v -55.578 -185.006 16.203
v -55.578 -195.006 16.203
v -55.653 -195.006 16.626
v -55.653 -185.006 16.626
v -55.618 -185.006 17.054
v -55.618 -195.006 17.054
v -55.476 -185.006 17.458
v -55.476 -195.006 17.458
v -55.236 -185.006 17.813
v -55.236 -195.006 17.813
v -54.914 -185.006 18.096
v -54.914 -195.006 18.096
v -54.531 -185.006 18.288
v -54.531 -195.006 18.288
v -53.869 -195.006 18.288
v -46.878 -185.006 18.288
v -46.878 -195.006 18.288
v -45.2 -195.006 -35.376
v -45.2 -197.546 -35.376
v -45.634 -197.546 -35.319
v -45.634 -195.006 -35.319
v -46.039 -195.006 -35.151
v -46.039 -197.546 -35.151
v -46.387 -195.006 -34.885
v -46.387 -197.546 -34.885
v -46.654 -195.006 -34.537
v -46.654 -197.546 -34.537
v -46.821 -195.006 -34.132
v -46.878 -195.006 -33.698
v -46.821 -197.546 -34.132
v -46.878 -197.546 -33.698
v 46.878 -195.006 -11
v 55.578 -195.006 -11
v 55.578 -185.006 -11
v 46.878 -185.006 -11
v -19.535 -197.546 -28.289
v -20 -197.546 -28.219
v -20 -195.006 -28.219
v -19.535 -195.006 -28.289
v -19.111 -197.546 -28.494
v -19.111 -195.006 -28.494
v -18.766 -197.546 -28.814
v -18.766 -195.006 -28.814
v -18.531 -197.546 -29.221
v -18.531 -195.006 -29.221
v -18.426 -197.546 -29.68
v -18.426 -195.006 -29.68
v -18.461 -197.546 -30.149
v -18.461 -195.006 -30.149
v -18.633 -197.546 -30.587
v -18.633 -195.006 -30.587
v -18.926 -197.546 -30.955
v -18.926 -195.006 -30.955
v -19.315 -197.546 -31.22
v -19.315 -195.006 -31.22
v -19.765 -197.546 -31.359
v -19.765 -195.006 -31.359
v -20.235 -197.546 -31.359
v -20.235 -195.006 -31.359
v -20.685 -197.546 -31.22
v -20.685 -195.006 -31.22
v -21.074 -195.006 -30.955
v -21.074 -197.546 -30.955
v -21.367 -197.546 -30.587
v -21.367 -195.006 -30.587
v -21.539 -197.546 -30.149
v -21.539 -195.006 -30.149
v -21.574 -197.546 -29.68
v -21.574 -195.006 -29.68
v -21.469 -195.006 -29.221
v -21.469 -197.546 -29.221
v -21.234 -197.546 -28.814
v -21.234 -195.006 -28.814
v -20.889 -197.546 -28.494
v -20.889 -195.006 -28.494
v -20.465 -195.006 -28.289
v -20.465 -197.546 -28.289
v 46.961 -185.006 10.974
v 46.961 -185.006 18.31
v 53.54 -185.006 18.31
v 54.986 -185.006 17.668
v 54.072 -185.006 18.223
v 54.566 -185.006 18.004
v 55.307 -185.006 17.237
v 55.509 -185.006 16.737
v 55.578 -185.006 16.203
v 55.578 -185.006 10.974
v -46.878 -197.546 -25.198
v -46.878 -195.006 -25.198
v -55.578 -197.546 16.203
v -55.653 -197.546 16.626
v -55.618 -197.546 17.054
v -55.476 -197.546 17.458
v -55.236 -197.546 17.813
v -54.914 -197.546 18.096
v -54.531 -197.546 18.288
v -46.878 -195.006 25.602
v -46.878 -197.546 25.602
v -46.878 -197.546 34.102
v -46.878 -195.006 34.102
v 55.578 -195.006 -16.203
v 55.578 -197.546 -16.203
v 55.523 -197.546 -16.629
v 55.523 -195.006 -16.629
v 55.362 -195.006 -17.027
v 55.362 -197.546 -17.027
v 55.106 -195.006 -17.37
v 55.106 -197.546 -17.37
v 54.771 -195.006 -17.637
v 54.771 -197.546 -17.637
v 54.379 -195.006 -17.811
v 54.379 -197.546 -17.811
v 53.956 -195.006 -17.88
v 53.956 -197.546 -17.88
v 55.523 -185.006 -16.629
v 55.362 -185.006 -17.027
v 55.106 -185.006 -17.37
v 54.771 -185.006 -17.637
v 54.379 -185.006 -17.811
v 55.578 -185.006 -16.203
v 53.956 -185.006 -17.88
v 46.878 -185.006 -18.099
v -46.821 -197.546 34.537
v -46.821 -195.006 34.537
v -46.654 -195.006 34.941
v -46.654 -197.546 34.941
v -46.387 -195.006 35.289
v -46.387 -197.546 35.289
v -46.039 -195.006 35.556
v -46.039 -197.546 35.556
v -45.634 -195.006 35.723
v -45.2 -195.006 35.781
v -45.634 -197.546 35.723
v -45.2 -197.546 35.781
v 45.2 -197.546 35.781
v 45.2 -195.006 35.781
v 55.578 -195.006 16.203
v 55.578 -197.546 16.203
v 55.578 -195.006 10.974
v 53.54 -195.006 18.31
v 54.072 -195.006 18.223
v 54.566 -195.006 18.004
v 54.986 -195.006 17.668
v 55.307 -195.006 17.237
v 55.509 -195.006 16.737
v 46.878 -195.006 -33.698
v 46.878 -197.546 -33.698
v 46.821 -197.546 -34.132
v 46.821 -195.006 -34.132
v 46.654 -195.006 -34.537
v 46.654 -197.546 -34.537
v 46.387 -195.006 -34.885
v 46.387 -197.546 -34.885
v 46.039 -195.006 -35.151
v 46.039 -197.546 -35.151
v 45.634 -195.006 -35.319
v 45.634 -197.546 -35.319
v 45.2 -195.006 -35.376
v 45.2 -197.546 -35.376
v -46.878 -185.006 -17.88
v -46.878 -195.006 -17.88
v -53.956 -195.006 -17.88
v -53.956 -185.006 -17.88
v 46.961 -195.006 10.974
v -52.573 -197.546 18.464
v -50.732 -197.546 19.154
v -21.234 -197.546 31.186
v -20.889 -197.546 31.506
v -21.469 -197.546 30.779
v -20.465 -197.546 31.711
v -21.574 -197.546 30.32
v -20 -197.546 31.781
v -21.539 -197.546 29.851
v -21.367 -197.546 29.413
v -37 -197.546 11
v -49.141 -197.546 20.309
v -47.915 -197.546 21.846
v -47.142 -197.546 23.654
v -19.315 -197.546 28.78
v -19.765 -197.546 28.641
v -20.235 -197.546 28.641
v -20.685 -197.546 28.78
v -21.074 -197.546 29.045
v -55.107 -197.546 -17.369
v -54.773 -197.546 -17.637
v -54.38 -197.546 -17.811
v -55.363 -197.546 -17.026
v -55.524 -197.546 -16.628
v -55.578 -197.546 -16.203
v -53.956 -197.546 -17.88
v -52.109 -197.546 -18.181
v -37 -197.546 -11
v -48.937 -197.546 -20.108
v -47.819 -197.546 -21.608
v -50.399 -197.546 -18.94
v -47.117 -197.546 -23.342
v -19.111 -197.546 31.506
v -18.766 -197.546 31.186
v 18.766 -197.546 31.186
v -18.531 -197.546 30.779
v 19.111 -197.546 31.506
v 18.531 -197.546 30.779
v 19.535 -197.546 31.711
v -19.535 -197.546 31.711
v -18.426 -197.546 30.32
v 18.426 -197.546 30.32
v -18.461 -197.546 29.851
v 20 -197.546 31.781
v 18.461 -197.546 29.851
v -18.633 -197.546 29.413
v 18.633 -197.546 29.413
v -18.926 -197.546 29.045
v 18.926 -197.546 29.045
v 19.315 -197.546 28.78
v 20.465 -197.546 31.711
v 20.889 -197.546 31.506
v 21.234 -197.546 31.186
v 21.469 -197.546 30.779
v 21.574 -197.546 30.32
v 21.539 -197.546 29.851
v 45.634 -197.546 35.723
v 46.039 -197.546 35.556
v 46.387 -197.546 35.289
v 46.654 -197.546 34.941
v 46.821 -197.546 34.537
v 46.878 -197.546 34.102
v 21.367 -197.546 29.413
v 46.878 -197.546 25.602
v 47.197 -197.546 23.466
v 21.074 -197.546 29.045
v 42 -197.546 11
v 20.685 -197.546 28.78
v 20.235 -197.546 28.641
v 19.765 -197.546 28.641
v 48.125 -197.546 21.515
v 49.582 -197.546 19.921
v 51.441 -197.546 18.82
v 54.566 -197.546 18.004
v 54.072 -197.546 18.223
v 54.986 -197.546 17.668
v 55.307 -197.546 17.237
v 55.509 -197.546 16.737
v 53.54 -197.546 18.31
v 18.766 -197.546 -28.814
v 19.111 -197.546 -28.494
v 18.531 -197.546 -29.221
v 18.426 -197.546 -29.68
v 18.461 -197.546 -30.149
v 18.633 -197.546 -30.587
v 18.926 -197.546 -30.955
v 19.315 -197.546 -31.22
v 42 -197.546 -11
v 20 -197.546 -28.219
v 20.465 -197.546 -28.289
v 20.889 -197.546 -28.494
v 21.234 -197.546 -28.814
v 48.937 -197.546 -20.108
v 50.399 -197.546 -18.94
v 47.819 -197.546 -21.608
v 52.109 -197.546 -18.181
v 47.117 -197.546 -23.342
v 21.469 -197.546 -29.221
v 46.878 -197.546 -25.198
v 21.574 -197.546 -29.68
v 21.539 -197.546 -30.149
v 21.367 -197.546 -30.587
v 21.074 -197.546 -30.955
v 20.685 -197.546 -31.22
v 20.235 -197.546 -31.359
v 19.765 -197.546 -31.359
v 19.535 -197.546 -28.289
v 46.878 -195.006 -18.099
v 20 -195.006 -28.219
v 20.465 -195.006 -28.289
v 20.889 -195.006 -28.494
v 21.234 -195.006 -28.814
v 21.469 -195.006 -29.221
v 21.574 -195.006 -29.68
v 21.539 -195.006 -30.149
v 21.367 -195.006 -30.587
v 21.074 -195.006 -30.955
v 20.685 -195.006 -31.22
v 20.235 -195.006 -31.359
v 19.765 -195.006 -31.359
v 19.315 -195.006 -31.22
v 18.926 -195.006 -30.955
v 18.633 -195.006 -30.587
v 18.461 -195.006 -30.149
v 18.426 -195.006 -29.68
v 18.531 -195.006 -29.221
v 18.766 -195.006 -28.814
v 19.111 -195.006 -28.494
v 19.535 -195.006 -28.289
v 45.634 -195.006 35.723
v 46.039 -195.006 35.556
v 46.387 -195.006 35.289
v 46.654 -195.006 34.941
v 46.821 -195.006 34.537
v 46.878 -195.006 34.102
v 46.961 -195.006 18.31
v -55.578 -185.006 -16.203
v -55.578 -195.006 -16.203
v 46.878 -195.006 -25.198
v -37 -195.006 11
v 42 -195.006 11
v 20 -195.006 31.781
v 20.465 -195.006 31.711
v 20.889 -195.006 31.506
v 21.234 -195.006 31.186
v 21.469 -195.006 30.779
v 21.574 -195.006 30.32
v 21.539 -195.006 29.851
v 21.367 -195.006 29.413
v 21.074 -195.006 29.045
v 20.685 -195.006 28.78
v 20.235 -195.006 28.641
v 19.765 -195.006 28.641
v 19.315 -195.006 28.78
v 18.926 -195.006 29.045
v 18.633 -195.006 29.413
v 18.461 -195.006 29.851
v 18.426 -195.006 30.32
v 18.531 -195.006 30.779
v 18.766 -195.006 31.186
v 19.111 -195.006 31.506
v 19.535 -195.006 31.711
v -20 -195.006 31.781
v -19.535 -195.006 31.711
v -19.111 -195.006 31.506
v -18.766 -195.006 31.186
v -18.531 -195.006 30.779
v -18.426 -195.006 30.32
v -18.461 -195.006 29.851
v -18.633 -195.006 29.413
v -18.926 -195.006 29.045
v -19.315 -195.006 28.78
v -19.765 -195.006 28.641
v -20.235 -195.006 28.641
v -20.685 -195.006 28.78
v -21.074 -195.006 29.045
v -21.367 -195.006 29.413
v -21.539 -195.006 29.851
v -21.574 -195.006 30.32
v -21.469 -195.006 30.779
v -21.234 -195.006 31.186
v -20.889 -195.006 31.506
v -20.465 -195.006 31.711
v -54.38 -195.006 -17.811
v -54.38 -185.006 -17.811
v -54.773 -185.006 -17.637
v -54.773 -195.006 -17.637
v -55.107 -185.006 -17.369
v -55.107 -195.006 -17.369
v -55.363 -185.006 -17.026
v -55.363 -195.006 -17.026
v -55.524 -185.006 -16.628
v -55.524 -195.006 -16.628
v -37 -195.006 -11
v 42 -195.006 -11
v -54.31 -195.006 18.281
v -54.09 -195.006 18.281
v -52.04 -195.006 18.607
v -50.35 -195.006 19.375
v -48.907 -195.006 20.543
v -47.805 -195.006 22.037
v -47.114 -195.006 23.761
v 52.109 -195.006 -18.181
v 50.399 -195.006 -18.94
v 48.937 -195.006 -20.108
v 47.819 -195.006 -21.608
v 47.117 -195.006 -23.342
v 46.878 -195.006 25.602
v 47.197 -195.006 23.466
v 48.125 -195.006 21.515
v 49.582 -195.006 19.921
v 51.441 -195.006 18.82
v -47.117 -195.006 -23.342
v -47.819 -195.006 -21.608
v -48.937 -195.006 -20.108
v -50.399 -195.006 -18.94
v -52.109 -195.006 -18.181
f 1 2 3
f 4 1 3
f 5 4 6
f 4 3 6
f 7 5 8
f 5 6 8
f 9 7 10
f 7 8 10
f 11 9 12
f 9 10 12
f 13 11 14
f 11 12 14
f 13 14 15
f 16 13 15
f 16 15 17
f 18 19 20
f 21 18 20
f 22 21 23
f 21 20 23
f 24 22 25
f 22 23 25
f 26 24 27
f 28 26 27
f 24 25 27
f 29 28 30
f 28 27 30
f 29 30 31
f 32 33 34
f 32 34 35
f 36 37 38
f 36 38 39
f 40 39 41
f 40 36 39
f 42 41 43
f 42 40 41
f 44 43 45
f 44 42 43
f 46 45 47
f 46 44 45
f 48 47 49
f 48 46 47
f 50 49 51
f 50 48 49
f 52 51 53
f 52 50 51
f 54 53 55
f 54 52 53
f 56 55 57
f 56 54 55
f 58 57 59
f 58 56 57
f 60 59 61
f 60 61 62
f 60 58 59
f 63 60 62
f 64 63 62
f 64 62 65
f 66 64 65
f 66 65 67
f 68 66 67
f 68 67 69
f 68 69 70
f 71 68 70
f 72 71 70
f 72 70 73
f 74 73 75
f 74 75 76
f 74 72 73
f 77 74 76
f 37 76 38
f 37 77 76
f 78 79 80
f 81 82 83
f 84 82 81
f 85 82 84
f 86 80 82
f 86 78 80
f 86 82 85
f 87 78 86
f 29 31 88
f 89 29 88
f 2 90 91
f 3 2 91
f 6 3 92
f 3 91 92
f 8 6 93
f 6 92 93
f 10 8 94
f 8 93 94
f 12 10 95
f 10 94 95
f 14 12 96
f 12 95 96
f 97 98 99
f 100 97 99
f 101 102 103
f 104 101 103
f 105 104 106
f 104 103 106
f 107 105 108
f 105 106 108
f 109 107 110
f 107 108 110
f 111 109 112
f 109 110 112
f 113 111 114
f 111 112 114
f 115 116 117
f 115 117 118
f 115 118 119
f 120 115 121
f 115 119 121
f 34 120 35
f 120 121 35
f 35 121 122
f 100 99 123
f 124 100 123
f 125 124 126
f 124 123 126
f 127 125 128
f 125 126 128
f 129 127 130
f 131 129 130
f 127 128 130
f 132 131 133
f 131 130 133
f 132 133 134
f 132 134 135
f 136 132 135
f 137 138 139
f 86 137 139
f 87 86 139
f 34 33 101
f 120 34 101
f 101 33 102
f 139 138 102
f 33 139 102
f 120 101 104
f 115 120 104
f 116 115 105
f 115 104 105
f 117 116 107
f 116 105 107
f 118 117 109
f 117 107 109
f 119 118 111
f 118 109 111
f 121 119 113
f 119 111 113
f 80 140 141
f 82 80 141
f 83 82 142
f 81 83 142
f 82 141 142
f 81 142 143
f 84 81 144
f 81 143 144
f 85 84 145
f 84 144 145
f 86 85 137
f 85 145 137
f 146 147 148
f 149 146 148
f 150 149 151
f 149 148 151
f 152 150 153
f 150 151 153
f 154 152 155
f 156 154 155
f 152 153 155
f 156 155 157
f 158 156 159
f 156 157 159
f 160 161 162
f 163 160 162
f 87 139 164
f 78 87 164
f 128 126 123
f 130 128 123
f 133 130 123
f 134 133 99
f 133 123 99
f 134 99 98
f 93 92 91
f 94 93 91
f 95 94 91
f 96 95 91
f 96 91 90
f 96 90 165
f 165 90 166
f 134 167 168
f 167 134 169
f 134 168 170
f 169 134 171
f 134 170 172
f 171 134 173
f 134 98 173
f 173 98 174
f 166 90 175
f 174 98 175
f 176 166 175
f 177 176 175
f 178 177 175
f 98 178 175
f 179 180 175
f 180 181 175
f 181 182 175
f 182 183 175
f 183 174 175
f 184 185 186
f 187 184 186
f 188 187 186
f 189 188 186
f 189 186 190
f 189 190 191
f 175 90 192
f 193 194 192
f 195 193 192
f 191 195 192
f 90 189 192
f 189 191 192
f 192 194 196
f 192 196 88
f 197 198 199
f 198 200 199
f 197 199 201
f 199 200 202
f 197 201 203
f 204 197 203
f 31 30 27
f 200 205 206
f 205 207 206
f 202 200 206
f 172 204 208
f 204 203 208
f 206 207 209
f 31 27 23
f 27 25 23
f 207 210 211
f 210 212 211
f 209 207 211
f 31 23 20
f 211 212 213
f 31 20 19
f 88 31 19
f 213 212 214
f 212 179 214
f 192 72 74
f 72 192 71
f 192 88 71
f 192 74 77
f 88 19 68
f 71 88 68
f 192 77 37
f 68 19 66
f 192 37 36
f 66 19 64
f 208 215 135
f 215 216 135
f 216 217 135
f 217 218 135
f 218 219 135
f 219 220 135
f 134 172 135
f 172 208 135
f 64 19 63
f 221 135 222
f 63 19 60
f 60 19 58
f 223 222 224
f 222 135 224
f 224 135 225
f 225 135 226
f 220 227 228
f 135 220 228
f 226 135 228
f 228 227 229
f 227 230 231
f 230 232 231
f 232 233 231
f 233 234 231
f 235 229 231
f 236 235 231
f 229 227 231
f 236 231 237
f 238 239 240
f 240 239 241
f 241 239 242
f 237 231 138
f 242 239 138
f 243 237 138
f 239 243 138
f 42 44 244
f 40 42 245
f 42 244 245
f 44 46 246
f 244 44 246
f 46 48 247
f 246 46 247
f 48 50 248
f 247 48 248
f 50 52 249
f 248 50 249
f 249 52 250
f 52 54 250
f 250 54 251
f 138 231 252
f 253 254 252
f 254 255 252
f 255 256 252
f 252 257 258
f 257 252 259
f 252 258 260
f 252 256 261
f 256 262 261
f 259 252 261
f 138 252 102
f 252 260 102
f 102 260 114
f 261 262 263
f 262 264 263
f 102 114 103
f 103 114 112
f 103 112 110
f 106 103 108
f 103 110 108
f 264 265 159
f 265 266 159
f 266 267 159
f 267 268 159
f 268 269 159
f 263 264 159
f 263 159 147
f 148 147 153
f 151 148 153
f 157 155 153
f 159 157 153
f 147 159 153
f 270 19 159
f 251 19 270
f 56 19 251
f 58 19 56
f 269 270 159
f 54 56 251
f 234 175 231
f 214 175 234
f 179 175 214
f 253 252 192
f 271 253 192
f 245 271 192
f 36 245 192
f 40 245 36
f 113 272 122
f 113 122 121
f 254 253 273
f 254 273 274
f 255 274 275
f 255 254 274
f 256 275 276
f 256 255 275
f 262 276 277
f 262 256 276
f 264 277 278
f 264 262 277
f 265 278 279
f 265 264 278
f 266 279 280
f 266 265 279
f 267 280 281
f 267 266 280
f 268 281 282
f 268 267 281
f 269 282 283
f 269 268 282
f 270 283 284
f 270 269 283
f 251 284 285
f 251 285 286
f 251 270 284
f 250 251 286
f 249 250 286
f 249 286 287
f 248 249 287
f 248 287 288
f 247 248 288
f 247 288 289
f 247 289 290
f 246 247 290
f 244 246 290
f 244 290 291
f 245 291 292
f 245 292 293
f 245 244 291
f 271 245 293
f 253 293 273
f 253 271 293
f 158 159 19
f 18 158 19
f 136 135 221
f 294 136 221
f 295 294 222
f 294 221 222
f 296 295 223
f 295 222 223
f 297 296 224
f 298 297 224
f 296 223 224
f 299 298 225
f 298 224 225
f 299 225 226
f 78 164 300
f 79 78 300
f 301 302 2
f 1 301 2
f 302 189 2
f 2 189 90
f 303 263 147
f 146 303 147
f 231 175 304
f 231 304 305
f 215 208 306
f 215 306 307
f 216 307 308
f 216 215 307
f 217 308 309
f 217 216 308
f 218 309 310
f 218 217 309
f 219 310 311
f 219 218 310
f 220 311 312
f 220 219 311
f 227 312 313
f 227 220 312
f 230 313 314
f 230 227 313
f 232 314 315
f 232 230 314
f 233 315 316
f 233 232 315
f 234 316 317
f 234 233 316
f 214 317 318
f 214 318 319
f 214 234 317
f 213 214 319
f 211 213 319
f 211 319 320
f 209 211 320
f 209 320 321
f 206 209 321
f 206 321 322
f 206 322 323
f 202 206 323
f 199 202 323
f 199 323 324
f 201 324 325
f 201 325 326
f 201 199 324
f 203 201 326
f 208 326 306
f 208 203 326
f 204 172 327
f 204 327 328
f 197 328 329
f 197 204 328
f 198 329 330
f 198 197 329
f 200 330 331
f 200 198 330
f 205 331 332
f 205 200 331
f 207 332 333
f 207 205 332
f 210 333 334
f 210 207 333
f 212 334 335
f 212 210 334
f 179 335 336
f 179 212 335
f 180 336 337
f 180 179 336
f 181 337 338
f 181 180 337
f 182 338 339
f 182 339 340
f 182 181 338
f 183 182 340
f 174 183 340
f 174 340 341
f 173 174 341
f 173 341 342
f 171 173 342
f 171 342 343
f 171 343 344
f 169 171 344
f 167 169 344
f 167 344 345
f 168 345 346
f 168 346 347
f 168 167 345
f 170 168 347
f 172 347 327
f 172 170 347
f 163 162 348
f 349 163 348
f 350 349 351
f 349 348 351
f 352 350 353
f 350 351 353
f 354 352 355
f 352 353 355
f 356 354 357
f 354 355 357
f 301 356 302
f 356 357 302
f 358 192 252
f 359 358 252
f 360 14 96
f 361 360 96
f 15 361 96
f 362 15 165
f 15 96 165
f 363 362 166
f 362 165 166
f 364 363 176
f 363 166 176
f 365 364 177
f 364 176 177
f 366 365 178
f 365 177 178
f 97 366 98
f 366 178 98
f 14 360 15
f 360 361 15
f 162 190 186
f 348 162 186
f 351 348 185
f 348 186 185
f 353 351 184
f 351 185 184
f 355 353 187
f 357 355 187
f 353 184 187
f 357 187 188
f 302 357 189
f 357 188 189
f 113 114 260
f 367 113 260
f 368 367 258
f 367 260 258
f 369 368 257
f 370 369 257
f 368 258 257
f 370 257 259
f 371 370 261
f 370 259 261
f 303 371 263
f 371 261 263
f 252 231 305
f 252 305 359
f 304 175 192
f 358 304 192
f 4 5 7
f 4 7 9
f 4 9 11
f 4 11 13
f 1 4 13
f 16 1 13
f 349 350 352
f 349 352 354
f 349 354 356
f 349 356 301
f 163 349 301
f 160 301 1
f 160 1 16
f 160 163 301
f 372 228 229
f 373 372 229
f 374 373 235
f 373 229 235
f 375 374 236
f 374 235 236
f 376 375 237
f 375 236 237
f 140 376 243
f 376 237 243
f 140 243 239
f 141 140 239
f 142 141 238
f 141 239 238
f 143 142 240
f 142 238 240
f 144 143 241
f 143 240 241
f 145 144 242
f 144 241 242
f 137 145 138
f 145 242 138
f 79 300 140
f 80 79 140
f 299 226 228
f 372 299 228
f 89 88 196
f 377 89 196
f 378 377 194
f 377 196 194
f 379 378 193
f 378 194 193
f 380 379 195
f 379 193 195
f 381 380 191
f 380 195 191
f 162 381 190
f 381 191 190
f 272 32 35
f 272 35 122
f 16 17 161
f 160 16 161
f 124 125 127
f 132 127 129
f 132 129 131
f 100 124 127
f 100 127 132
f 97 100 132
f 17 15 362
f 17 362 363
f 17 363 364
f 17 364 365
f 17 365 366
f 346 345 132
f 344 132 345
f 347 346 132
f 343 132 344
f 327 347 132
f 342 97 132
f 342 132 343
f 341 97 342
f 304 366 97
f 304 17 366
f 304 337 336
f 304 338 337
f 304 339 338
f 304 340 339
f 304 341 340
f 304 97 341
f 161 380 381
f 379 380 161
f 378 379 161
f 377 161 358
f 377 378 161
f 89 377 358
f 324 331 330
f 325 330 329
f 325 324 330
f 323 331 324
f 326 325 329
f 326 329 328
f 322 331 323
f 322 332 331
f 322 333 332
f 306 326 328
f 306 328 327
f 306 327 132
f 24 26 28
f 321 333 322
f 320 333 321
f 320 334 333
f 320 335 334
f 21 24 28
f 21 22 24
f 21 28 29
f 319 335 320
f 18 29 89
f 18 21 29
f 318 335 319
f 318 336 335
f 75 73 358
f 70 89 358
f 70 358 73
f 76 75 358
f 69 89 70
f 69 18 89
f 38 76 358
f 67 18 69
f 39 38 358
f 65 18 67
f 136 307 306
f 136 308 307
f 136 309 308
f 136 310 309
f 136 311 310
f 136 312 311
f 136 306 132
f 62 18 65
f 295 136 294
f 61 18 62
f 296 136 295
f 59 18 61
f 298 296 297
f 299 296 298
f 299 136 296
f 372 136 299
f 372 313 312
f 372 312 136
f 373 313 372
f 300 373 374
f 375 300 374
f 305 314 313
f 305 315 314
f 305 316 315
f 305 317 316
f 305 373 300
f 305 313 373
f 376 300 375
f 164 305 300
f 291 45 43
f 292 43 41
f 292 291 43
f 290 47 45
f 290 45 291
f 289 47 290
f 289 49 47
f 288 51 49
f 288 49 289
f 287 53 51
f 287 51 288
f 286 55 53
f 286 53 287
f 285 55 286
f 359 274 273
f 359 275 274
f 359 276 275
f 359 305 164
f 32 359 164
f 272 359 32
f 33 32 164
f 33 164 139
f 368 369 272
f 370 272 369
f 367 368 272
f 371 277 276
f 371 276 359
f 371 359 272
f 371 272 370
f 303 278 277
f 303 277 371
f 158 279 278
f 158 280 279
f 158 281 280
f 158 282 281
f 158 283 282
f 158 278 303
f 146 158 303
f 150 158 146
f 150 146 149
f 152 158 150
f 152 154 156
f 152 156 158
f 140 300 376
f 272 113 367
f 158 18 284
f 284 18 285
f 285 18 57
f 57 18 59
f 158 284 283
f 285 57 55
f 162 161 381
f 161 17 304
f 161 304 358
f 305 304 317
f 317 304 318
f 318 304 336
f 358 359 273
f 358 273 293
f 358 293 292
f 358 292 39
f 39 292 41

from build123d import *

# Parameters (mm, degrees)
SKETCH1_R           = 1.578396945
SKETCH1_W           = 79
SKETCH1_H           = 22
BOSS_EXTRUDE2_DEPTH = 2.54
BOSS_EXTRUDE3_DEPTH = 10


with BuildPart() as part:
    # Sketch1 → Boss-Extrude2 (new body)
    with BuildSketch(Plane(origin=(0, -197.546287398, 0), x_dir=(1, 0, 0), z_dir=(0, 1, 0))):
        with BuildLine():
            Line((-46.878416922, -25.602241557), (-46.878416922, -34.102241557))
            ThreePointArc((-46.878416922, -34.102241557), (-46.386819987, -35.289061544), (-45.2, -35.780658479))
            Line((-45.2, -35.780658479), (45.2, -35.780658479))
            ThreePointArc((45.2, -35.780658479), (46.386819987, -35.289061544), (46.878416922, -34.102241557))
            Line((46.878416922, -34.102241557), (46.878416922, -25.602241557))
            ThreePointArc((46.878416922, -25.602241557), (48.794516666, -20.66399163), (53.539905947, -18.310476992))
            add(Edge.make_bspline(
                [(53.539905947, -18.310476992), (53.808834541, -18.301511025), (54.349538715, -18.177417281), (55.023147103, -17.704797385), (55.473345475, -17.014152088), (55.578416916, -16.471377582), (55.578416922, -16.202870307)],
                knots=[0, 0, 0, 0, 0.001023741, 0.002047483, 0.003071224, 0.004094966, 0.004094966, 0.004094966, 0.004094966], degree=3))
            Line((55.578416922, -16.202870307), (55.578416922, 16.202870307))
            add(Edge.make_bspline(
                [(55.578416922, 16.202870307), (55.578416922, 16.417020125), (55.494048854, 16.850399632), (55.135979489, 17.398736831), (54.59856303, 17.775150348), (54.169613982, 17.873120493), (53.956037061, 17.880241063)],
                knots=[0, 0, 0, 0, 0.001023741, 0.002047483, 0.003071224, 0.004094966, 0.004094966, 0.004094966, 0.004094966], degree=3))
            ThreePointArc((53.956037061, 17.880241063), (48.93731184, 20.107602085), (46.878416939, 25.197758443))
            Line((46.878416939, 25.197758443), (46.878416939, 33.697758443))
            ThreePointArc((46.878416939, 33.697758443), (46.386819998, 34.884578436), (45.2, 35.376175365))
            Line((45.2, 35.376175365), (-45.2, 35.376175365))
            ThreePointArc((-45.2, 35.376175365), (-46.386819987, 34.88457843), (-46.878416922, 33.697758443))
            Line((-46.878416922, 33.697758443), (-46.878416922, 25.197758443))
            ThreePointArc((-46.878416922, 25.197758443), (-48.93731182, 20.107602071), (-53.956037052, 17.880241046))
            add(Edge.make_bspline(
                [(-53.956037052, 17.880241046), (-54.170067952, 17.873105344), (-54.600395569, 17.774343455), (-55.136497018, 17.398201742), (-55.494794219, 16.848541208), (-55.578416918, 16.416565886), (-55.578416922, 16.202870299)],
                knots=[0, 0, 0, 0, 0.001023741, 0.002047483, 0.003071224, 0.004094966, 0.004094966, 0.004094966, 0.004094966], degree=3))
            Line((-55.578416922, 16.202870299), (-55.578416922, -16.202870299))
            add(Edge.make_bspline(
                [(-55.578416922, -16.202870299), (-55.642358512, -16.407251091), (-55.69123907, -16.846051723), (-55.513228421, -17.476288615), (-55.112718518, -17.995994665), (-54.73258941, -18.21757272), (-54.530881465, -18.288139)],
                knots=[0, 0, 0, 0, 0.001023741, 0.002047483, 0.003071224, 0.004094966, 0.004094966, 0.004094966, 0.004094966], degree=3))
            ThreePointArc((-54.530881465, -18.288139), (-49.141195663, -20.309408908), (-46.878416922, -25.602241557))
        make_face()
        with Locations(Location((-20, 29.797758443, 0), (0, 0, 270))):
            Circle(SKETCH1_R, mode=Mode.SUBTRACT)
        with Locations(Location((-20, -30.202241557, 0), (0, 0, 270))):
            Circle(SKETCH1_R, mode=Mode.SUBTRACT)
        with Locations(Location((20, -30.202241557, 0), (0, 0, 270))):
            Circle(SKETCH1_R, mode=Mode.SUBTRACT)
        with Locations(Location((20.000000018, 29.79775846, 0), (0, 0, 270))):
            Circle(SKETCH1_R, mode=Mode.SUBTRACT)
        with Locations((2.5, 0)):
            Rectangle(SKETCH1_W, SKETCH1_H, mode=Mode.SUBTRACT)
    extrude(amount=BOSS_EXTRUDE2_DEPTH)

    # Sketch2 → Boss-Extrude3 (add)
    with BuildSketch(Plane(origin=(0, -195.006287398, 0), x_dir=(1, 0, 0), z_dir=(0, 1, 0))):
        with BuildLine():
            Line((-55.578416922, 16.202870299), (-55.578416922, -16.202870299))
            add(Edge.make_bspline(
                [(-55.578416922, -16.202870299), (-55.642358512, -16.407251091), (-55.69123907, -16.846051723), (-55.513228421, -17.476288615), (-55.112718518, -17.995994665), (-54.73258941, -18.21757272), (-54.530881465, -18.288139)],
                knots=[0, 0, 0, 0, 0.001023741, 0.002047483, 0.003071224, 0.004094966, 0.004094966, 0.004094966, 0.004094966], degree=3))
            Line((-54.530881465, -18.288139), (-46.878416922, -18.288139))
            Line((-46.878416922, -18.288139), (-46.878416922, 17.880241046))
            Line((-46.878416922, 17.880241046), (-53.956037052, 17.880241046))
            add(Edge.make_bspline(
                [(-53.956037052, 17.880241046), (-54.170067952, 17.873105344), (-54.600395569, 17.774343455), (-55.136497018, 17.398201742), (-55.494794219, 16.848541208), (-55.578416918, 16.416565886), (-55.578416922, 16.202870299)],
                knots=[0, 0, 0, 0, 0.001023741, 0.002047483, 0.003071224, 0.004094966, 0.004094966, 0.004094966, 0.004094966], degree=3))
        make_face()
        with BuildLine():
            Line((55.578416922, -10.974069665), (46.960695339, -10.974069665))
            Line((46.960695339, -10.974069665), (46.960695339, -18.310476992))
            Line((46.960695339, -18.310476992), (53.539905947, -18.310476992))
            add(Edge.make_bspline(
                [(53.539905947, -18.310476992), (53.808834541, -18.301511025), (54.349538715, -18.177417281), (55.023147103, -17.704797385), (55.473345475, -17.014152088), (55.578416916, -16.471377582), (55.578416922, -16.202870307)],
                knots=[0, 0, 0, 0, 0.001023741, 0.002047483, 0.003071224, 0.004094966, 0.004094966, 0.004094966, 0.004094966], degree=3))
            Line((55.578416922, -16.202870307), (55.578416922, -10.974069665))
        make_face()
        with BuildLine():
            Line((55.578416922, 10.999543279), (46.878416939, 10.999543279))
            Line((46.878416939, 10.999543279), (46.878416939, 18.098650861))
            Line((46.878416939, 18.098650861), (53.956037061, 17.880241063))
            add(Edge.make_bspline(
                [(55.578416922, 16.202870307), (55.578416922, 16.417020125), (55.494048854, 16.850399632), (55.135979489, 17.398736831), (54.59856303, 17.775150348), (54.169613982, 17.873120493), (53.956037061, 17.880241063)],
                knots=[0, 0, 0, 0, 0.001023741, 0.002047483, 0.003071224, 0.004094966, 0.004094966, 0.004094966, 0.004094966], degree=3))
            Line((55.578416922, 16.202870307), (55.578416922, 10.999543279))
        make_face()
    extrude(amount=BOSS_EXTRUDE3_DEPTH)


solid = part.part
